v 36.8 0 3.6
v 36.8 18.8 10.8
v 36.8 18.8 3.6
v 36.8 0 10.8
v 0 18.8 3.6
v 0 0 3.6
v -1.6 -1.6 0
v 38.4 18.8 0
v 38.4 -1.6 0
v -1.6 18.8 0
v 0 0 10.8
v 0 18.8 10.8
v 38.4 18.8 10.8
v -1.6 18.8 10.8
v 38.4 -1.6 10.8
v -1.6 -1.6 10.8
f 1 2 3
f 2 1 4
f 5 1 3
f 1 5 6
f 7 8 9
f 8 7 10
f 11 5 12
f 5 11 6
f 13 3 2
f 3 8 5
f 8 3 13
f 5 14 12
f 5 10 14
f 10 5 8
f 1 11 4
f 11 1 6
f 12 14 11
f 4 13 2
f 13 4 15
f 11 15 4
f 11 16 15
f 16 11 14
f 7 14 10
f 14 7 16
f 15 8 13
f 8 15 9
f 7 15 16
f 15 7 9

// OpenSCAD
//GamingErhoehung
a=18;
b=36;

h=3.6;
ha=h*2;

t=1.6;
to=0.8;


cube([b+to,a+to,h]);

translate([-t,0,0])
cube([t,a+to,h+ha]);

translate([b+to,0,0])
cube([t,a+to,h+ha]);

translate([-t,-t,0])
cube([b+to+t+t,t,h+ha]);

//translate([-t,a+to,0])
//orcacube([b+to+t+t,t,h+ha]);
